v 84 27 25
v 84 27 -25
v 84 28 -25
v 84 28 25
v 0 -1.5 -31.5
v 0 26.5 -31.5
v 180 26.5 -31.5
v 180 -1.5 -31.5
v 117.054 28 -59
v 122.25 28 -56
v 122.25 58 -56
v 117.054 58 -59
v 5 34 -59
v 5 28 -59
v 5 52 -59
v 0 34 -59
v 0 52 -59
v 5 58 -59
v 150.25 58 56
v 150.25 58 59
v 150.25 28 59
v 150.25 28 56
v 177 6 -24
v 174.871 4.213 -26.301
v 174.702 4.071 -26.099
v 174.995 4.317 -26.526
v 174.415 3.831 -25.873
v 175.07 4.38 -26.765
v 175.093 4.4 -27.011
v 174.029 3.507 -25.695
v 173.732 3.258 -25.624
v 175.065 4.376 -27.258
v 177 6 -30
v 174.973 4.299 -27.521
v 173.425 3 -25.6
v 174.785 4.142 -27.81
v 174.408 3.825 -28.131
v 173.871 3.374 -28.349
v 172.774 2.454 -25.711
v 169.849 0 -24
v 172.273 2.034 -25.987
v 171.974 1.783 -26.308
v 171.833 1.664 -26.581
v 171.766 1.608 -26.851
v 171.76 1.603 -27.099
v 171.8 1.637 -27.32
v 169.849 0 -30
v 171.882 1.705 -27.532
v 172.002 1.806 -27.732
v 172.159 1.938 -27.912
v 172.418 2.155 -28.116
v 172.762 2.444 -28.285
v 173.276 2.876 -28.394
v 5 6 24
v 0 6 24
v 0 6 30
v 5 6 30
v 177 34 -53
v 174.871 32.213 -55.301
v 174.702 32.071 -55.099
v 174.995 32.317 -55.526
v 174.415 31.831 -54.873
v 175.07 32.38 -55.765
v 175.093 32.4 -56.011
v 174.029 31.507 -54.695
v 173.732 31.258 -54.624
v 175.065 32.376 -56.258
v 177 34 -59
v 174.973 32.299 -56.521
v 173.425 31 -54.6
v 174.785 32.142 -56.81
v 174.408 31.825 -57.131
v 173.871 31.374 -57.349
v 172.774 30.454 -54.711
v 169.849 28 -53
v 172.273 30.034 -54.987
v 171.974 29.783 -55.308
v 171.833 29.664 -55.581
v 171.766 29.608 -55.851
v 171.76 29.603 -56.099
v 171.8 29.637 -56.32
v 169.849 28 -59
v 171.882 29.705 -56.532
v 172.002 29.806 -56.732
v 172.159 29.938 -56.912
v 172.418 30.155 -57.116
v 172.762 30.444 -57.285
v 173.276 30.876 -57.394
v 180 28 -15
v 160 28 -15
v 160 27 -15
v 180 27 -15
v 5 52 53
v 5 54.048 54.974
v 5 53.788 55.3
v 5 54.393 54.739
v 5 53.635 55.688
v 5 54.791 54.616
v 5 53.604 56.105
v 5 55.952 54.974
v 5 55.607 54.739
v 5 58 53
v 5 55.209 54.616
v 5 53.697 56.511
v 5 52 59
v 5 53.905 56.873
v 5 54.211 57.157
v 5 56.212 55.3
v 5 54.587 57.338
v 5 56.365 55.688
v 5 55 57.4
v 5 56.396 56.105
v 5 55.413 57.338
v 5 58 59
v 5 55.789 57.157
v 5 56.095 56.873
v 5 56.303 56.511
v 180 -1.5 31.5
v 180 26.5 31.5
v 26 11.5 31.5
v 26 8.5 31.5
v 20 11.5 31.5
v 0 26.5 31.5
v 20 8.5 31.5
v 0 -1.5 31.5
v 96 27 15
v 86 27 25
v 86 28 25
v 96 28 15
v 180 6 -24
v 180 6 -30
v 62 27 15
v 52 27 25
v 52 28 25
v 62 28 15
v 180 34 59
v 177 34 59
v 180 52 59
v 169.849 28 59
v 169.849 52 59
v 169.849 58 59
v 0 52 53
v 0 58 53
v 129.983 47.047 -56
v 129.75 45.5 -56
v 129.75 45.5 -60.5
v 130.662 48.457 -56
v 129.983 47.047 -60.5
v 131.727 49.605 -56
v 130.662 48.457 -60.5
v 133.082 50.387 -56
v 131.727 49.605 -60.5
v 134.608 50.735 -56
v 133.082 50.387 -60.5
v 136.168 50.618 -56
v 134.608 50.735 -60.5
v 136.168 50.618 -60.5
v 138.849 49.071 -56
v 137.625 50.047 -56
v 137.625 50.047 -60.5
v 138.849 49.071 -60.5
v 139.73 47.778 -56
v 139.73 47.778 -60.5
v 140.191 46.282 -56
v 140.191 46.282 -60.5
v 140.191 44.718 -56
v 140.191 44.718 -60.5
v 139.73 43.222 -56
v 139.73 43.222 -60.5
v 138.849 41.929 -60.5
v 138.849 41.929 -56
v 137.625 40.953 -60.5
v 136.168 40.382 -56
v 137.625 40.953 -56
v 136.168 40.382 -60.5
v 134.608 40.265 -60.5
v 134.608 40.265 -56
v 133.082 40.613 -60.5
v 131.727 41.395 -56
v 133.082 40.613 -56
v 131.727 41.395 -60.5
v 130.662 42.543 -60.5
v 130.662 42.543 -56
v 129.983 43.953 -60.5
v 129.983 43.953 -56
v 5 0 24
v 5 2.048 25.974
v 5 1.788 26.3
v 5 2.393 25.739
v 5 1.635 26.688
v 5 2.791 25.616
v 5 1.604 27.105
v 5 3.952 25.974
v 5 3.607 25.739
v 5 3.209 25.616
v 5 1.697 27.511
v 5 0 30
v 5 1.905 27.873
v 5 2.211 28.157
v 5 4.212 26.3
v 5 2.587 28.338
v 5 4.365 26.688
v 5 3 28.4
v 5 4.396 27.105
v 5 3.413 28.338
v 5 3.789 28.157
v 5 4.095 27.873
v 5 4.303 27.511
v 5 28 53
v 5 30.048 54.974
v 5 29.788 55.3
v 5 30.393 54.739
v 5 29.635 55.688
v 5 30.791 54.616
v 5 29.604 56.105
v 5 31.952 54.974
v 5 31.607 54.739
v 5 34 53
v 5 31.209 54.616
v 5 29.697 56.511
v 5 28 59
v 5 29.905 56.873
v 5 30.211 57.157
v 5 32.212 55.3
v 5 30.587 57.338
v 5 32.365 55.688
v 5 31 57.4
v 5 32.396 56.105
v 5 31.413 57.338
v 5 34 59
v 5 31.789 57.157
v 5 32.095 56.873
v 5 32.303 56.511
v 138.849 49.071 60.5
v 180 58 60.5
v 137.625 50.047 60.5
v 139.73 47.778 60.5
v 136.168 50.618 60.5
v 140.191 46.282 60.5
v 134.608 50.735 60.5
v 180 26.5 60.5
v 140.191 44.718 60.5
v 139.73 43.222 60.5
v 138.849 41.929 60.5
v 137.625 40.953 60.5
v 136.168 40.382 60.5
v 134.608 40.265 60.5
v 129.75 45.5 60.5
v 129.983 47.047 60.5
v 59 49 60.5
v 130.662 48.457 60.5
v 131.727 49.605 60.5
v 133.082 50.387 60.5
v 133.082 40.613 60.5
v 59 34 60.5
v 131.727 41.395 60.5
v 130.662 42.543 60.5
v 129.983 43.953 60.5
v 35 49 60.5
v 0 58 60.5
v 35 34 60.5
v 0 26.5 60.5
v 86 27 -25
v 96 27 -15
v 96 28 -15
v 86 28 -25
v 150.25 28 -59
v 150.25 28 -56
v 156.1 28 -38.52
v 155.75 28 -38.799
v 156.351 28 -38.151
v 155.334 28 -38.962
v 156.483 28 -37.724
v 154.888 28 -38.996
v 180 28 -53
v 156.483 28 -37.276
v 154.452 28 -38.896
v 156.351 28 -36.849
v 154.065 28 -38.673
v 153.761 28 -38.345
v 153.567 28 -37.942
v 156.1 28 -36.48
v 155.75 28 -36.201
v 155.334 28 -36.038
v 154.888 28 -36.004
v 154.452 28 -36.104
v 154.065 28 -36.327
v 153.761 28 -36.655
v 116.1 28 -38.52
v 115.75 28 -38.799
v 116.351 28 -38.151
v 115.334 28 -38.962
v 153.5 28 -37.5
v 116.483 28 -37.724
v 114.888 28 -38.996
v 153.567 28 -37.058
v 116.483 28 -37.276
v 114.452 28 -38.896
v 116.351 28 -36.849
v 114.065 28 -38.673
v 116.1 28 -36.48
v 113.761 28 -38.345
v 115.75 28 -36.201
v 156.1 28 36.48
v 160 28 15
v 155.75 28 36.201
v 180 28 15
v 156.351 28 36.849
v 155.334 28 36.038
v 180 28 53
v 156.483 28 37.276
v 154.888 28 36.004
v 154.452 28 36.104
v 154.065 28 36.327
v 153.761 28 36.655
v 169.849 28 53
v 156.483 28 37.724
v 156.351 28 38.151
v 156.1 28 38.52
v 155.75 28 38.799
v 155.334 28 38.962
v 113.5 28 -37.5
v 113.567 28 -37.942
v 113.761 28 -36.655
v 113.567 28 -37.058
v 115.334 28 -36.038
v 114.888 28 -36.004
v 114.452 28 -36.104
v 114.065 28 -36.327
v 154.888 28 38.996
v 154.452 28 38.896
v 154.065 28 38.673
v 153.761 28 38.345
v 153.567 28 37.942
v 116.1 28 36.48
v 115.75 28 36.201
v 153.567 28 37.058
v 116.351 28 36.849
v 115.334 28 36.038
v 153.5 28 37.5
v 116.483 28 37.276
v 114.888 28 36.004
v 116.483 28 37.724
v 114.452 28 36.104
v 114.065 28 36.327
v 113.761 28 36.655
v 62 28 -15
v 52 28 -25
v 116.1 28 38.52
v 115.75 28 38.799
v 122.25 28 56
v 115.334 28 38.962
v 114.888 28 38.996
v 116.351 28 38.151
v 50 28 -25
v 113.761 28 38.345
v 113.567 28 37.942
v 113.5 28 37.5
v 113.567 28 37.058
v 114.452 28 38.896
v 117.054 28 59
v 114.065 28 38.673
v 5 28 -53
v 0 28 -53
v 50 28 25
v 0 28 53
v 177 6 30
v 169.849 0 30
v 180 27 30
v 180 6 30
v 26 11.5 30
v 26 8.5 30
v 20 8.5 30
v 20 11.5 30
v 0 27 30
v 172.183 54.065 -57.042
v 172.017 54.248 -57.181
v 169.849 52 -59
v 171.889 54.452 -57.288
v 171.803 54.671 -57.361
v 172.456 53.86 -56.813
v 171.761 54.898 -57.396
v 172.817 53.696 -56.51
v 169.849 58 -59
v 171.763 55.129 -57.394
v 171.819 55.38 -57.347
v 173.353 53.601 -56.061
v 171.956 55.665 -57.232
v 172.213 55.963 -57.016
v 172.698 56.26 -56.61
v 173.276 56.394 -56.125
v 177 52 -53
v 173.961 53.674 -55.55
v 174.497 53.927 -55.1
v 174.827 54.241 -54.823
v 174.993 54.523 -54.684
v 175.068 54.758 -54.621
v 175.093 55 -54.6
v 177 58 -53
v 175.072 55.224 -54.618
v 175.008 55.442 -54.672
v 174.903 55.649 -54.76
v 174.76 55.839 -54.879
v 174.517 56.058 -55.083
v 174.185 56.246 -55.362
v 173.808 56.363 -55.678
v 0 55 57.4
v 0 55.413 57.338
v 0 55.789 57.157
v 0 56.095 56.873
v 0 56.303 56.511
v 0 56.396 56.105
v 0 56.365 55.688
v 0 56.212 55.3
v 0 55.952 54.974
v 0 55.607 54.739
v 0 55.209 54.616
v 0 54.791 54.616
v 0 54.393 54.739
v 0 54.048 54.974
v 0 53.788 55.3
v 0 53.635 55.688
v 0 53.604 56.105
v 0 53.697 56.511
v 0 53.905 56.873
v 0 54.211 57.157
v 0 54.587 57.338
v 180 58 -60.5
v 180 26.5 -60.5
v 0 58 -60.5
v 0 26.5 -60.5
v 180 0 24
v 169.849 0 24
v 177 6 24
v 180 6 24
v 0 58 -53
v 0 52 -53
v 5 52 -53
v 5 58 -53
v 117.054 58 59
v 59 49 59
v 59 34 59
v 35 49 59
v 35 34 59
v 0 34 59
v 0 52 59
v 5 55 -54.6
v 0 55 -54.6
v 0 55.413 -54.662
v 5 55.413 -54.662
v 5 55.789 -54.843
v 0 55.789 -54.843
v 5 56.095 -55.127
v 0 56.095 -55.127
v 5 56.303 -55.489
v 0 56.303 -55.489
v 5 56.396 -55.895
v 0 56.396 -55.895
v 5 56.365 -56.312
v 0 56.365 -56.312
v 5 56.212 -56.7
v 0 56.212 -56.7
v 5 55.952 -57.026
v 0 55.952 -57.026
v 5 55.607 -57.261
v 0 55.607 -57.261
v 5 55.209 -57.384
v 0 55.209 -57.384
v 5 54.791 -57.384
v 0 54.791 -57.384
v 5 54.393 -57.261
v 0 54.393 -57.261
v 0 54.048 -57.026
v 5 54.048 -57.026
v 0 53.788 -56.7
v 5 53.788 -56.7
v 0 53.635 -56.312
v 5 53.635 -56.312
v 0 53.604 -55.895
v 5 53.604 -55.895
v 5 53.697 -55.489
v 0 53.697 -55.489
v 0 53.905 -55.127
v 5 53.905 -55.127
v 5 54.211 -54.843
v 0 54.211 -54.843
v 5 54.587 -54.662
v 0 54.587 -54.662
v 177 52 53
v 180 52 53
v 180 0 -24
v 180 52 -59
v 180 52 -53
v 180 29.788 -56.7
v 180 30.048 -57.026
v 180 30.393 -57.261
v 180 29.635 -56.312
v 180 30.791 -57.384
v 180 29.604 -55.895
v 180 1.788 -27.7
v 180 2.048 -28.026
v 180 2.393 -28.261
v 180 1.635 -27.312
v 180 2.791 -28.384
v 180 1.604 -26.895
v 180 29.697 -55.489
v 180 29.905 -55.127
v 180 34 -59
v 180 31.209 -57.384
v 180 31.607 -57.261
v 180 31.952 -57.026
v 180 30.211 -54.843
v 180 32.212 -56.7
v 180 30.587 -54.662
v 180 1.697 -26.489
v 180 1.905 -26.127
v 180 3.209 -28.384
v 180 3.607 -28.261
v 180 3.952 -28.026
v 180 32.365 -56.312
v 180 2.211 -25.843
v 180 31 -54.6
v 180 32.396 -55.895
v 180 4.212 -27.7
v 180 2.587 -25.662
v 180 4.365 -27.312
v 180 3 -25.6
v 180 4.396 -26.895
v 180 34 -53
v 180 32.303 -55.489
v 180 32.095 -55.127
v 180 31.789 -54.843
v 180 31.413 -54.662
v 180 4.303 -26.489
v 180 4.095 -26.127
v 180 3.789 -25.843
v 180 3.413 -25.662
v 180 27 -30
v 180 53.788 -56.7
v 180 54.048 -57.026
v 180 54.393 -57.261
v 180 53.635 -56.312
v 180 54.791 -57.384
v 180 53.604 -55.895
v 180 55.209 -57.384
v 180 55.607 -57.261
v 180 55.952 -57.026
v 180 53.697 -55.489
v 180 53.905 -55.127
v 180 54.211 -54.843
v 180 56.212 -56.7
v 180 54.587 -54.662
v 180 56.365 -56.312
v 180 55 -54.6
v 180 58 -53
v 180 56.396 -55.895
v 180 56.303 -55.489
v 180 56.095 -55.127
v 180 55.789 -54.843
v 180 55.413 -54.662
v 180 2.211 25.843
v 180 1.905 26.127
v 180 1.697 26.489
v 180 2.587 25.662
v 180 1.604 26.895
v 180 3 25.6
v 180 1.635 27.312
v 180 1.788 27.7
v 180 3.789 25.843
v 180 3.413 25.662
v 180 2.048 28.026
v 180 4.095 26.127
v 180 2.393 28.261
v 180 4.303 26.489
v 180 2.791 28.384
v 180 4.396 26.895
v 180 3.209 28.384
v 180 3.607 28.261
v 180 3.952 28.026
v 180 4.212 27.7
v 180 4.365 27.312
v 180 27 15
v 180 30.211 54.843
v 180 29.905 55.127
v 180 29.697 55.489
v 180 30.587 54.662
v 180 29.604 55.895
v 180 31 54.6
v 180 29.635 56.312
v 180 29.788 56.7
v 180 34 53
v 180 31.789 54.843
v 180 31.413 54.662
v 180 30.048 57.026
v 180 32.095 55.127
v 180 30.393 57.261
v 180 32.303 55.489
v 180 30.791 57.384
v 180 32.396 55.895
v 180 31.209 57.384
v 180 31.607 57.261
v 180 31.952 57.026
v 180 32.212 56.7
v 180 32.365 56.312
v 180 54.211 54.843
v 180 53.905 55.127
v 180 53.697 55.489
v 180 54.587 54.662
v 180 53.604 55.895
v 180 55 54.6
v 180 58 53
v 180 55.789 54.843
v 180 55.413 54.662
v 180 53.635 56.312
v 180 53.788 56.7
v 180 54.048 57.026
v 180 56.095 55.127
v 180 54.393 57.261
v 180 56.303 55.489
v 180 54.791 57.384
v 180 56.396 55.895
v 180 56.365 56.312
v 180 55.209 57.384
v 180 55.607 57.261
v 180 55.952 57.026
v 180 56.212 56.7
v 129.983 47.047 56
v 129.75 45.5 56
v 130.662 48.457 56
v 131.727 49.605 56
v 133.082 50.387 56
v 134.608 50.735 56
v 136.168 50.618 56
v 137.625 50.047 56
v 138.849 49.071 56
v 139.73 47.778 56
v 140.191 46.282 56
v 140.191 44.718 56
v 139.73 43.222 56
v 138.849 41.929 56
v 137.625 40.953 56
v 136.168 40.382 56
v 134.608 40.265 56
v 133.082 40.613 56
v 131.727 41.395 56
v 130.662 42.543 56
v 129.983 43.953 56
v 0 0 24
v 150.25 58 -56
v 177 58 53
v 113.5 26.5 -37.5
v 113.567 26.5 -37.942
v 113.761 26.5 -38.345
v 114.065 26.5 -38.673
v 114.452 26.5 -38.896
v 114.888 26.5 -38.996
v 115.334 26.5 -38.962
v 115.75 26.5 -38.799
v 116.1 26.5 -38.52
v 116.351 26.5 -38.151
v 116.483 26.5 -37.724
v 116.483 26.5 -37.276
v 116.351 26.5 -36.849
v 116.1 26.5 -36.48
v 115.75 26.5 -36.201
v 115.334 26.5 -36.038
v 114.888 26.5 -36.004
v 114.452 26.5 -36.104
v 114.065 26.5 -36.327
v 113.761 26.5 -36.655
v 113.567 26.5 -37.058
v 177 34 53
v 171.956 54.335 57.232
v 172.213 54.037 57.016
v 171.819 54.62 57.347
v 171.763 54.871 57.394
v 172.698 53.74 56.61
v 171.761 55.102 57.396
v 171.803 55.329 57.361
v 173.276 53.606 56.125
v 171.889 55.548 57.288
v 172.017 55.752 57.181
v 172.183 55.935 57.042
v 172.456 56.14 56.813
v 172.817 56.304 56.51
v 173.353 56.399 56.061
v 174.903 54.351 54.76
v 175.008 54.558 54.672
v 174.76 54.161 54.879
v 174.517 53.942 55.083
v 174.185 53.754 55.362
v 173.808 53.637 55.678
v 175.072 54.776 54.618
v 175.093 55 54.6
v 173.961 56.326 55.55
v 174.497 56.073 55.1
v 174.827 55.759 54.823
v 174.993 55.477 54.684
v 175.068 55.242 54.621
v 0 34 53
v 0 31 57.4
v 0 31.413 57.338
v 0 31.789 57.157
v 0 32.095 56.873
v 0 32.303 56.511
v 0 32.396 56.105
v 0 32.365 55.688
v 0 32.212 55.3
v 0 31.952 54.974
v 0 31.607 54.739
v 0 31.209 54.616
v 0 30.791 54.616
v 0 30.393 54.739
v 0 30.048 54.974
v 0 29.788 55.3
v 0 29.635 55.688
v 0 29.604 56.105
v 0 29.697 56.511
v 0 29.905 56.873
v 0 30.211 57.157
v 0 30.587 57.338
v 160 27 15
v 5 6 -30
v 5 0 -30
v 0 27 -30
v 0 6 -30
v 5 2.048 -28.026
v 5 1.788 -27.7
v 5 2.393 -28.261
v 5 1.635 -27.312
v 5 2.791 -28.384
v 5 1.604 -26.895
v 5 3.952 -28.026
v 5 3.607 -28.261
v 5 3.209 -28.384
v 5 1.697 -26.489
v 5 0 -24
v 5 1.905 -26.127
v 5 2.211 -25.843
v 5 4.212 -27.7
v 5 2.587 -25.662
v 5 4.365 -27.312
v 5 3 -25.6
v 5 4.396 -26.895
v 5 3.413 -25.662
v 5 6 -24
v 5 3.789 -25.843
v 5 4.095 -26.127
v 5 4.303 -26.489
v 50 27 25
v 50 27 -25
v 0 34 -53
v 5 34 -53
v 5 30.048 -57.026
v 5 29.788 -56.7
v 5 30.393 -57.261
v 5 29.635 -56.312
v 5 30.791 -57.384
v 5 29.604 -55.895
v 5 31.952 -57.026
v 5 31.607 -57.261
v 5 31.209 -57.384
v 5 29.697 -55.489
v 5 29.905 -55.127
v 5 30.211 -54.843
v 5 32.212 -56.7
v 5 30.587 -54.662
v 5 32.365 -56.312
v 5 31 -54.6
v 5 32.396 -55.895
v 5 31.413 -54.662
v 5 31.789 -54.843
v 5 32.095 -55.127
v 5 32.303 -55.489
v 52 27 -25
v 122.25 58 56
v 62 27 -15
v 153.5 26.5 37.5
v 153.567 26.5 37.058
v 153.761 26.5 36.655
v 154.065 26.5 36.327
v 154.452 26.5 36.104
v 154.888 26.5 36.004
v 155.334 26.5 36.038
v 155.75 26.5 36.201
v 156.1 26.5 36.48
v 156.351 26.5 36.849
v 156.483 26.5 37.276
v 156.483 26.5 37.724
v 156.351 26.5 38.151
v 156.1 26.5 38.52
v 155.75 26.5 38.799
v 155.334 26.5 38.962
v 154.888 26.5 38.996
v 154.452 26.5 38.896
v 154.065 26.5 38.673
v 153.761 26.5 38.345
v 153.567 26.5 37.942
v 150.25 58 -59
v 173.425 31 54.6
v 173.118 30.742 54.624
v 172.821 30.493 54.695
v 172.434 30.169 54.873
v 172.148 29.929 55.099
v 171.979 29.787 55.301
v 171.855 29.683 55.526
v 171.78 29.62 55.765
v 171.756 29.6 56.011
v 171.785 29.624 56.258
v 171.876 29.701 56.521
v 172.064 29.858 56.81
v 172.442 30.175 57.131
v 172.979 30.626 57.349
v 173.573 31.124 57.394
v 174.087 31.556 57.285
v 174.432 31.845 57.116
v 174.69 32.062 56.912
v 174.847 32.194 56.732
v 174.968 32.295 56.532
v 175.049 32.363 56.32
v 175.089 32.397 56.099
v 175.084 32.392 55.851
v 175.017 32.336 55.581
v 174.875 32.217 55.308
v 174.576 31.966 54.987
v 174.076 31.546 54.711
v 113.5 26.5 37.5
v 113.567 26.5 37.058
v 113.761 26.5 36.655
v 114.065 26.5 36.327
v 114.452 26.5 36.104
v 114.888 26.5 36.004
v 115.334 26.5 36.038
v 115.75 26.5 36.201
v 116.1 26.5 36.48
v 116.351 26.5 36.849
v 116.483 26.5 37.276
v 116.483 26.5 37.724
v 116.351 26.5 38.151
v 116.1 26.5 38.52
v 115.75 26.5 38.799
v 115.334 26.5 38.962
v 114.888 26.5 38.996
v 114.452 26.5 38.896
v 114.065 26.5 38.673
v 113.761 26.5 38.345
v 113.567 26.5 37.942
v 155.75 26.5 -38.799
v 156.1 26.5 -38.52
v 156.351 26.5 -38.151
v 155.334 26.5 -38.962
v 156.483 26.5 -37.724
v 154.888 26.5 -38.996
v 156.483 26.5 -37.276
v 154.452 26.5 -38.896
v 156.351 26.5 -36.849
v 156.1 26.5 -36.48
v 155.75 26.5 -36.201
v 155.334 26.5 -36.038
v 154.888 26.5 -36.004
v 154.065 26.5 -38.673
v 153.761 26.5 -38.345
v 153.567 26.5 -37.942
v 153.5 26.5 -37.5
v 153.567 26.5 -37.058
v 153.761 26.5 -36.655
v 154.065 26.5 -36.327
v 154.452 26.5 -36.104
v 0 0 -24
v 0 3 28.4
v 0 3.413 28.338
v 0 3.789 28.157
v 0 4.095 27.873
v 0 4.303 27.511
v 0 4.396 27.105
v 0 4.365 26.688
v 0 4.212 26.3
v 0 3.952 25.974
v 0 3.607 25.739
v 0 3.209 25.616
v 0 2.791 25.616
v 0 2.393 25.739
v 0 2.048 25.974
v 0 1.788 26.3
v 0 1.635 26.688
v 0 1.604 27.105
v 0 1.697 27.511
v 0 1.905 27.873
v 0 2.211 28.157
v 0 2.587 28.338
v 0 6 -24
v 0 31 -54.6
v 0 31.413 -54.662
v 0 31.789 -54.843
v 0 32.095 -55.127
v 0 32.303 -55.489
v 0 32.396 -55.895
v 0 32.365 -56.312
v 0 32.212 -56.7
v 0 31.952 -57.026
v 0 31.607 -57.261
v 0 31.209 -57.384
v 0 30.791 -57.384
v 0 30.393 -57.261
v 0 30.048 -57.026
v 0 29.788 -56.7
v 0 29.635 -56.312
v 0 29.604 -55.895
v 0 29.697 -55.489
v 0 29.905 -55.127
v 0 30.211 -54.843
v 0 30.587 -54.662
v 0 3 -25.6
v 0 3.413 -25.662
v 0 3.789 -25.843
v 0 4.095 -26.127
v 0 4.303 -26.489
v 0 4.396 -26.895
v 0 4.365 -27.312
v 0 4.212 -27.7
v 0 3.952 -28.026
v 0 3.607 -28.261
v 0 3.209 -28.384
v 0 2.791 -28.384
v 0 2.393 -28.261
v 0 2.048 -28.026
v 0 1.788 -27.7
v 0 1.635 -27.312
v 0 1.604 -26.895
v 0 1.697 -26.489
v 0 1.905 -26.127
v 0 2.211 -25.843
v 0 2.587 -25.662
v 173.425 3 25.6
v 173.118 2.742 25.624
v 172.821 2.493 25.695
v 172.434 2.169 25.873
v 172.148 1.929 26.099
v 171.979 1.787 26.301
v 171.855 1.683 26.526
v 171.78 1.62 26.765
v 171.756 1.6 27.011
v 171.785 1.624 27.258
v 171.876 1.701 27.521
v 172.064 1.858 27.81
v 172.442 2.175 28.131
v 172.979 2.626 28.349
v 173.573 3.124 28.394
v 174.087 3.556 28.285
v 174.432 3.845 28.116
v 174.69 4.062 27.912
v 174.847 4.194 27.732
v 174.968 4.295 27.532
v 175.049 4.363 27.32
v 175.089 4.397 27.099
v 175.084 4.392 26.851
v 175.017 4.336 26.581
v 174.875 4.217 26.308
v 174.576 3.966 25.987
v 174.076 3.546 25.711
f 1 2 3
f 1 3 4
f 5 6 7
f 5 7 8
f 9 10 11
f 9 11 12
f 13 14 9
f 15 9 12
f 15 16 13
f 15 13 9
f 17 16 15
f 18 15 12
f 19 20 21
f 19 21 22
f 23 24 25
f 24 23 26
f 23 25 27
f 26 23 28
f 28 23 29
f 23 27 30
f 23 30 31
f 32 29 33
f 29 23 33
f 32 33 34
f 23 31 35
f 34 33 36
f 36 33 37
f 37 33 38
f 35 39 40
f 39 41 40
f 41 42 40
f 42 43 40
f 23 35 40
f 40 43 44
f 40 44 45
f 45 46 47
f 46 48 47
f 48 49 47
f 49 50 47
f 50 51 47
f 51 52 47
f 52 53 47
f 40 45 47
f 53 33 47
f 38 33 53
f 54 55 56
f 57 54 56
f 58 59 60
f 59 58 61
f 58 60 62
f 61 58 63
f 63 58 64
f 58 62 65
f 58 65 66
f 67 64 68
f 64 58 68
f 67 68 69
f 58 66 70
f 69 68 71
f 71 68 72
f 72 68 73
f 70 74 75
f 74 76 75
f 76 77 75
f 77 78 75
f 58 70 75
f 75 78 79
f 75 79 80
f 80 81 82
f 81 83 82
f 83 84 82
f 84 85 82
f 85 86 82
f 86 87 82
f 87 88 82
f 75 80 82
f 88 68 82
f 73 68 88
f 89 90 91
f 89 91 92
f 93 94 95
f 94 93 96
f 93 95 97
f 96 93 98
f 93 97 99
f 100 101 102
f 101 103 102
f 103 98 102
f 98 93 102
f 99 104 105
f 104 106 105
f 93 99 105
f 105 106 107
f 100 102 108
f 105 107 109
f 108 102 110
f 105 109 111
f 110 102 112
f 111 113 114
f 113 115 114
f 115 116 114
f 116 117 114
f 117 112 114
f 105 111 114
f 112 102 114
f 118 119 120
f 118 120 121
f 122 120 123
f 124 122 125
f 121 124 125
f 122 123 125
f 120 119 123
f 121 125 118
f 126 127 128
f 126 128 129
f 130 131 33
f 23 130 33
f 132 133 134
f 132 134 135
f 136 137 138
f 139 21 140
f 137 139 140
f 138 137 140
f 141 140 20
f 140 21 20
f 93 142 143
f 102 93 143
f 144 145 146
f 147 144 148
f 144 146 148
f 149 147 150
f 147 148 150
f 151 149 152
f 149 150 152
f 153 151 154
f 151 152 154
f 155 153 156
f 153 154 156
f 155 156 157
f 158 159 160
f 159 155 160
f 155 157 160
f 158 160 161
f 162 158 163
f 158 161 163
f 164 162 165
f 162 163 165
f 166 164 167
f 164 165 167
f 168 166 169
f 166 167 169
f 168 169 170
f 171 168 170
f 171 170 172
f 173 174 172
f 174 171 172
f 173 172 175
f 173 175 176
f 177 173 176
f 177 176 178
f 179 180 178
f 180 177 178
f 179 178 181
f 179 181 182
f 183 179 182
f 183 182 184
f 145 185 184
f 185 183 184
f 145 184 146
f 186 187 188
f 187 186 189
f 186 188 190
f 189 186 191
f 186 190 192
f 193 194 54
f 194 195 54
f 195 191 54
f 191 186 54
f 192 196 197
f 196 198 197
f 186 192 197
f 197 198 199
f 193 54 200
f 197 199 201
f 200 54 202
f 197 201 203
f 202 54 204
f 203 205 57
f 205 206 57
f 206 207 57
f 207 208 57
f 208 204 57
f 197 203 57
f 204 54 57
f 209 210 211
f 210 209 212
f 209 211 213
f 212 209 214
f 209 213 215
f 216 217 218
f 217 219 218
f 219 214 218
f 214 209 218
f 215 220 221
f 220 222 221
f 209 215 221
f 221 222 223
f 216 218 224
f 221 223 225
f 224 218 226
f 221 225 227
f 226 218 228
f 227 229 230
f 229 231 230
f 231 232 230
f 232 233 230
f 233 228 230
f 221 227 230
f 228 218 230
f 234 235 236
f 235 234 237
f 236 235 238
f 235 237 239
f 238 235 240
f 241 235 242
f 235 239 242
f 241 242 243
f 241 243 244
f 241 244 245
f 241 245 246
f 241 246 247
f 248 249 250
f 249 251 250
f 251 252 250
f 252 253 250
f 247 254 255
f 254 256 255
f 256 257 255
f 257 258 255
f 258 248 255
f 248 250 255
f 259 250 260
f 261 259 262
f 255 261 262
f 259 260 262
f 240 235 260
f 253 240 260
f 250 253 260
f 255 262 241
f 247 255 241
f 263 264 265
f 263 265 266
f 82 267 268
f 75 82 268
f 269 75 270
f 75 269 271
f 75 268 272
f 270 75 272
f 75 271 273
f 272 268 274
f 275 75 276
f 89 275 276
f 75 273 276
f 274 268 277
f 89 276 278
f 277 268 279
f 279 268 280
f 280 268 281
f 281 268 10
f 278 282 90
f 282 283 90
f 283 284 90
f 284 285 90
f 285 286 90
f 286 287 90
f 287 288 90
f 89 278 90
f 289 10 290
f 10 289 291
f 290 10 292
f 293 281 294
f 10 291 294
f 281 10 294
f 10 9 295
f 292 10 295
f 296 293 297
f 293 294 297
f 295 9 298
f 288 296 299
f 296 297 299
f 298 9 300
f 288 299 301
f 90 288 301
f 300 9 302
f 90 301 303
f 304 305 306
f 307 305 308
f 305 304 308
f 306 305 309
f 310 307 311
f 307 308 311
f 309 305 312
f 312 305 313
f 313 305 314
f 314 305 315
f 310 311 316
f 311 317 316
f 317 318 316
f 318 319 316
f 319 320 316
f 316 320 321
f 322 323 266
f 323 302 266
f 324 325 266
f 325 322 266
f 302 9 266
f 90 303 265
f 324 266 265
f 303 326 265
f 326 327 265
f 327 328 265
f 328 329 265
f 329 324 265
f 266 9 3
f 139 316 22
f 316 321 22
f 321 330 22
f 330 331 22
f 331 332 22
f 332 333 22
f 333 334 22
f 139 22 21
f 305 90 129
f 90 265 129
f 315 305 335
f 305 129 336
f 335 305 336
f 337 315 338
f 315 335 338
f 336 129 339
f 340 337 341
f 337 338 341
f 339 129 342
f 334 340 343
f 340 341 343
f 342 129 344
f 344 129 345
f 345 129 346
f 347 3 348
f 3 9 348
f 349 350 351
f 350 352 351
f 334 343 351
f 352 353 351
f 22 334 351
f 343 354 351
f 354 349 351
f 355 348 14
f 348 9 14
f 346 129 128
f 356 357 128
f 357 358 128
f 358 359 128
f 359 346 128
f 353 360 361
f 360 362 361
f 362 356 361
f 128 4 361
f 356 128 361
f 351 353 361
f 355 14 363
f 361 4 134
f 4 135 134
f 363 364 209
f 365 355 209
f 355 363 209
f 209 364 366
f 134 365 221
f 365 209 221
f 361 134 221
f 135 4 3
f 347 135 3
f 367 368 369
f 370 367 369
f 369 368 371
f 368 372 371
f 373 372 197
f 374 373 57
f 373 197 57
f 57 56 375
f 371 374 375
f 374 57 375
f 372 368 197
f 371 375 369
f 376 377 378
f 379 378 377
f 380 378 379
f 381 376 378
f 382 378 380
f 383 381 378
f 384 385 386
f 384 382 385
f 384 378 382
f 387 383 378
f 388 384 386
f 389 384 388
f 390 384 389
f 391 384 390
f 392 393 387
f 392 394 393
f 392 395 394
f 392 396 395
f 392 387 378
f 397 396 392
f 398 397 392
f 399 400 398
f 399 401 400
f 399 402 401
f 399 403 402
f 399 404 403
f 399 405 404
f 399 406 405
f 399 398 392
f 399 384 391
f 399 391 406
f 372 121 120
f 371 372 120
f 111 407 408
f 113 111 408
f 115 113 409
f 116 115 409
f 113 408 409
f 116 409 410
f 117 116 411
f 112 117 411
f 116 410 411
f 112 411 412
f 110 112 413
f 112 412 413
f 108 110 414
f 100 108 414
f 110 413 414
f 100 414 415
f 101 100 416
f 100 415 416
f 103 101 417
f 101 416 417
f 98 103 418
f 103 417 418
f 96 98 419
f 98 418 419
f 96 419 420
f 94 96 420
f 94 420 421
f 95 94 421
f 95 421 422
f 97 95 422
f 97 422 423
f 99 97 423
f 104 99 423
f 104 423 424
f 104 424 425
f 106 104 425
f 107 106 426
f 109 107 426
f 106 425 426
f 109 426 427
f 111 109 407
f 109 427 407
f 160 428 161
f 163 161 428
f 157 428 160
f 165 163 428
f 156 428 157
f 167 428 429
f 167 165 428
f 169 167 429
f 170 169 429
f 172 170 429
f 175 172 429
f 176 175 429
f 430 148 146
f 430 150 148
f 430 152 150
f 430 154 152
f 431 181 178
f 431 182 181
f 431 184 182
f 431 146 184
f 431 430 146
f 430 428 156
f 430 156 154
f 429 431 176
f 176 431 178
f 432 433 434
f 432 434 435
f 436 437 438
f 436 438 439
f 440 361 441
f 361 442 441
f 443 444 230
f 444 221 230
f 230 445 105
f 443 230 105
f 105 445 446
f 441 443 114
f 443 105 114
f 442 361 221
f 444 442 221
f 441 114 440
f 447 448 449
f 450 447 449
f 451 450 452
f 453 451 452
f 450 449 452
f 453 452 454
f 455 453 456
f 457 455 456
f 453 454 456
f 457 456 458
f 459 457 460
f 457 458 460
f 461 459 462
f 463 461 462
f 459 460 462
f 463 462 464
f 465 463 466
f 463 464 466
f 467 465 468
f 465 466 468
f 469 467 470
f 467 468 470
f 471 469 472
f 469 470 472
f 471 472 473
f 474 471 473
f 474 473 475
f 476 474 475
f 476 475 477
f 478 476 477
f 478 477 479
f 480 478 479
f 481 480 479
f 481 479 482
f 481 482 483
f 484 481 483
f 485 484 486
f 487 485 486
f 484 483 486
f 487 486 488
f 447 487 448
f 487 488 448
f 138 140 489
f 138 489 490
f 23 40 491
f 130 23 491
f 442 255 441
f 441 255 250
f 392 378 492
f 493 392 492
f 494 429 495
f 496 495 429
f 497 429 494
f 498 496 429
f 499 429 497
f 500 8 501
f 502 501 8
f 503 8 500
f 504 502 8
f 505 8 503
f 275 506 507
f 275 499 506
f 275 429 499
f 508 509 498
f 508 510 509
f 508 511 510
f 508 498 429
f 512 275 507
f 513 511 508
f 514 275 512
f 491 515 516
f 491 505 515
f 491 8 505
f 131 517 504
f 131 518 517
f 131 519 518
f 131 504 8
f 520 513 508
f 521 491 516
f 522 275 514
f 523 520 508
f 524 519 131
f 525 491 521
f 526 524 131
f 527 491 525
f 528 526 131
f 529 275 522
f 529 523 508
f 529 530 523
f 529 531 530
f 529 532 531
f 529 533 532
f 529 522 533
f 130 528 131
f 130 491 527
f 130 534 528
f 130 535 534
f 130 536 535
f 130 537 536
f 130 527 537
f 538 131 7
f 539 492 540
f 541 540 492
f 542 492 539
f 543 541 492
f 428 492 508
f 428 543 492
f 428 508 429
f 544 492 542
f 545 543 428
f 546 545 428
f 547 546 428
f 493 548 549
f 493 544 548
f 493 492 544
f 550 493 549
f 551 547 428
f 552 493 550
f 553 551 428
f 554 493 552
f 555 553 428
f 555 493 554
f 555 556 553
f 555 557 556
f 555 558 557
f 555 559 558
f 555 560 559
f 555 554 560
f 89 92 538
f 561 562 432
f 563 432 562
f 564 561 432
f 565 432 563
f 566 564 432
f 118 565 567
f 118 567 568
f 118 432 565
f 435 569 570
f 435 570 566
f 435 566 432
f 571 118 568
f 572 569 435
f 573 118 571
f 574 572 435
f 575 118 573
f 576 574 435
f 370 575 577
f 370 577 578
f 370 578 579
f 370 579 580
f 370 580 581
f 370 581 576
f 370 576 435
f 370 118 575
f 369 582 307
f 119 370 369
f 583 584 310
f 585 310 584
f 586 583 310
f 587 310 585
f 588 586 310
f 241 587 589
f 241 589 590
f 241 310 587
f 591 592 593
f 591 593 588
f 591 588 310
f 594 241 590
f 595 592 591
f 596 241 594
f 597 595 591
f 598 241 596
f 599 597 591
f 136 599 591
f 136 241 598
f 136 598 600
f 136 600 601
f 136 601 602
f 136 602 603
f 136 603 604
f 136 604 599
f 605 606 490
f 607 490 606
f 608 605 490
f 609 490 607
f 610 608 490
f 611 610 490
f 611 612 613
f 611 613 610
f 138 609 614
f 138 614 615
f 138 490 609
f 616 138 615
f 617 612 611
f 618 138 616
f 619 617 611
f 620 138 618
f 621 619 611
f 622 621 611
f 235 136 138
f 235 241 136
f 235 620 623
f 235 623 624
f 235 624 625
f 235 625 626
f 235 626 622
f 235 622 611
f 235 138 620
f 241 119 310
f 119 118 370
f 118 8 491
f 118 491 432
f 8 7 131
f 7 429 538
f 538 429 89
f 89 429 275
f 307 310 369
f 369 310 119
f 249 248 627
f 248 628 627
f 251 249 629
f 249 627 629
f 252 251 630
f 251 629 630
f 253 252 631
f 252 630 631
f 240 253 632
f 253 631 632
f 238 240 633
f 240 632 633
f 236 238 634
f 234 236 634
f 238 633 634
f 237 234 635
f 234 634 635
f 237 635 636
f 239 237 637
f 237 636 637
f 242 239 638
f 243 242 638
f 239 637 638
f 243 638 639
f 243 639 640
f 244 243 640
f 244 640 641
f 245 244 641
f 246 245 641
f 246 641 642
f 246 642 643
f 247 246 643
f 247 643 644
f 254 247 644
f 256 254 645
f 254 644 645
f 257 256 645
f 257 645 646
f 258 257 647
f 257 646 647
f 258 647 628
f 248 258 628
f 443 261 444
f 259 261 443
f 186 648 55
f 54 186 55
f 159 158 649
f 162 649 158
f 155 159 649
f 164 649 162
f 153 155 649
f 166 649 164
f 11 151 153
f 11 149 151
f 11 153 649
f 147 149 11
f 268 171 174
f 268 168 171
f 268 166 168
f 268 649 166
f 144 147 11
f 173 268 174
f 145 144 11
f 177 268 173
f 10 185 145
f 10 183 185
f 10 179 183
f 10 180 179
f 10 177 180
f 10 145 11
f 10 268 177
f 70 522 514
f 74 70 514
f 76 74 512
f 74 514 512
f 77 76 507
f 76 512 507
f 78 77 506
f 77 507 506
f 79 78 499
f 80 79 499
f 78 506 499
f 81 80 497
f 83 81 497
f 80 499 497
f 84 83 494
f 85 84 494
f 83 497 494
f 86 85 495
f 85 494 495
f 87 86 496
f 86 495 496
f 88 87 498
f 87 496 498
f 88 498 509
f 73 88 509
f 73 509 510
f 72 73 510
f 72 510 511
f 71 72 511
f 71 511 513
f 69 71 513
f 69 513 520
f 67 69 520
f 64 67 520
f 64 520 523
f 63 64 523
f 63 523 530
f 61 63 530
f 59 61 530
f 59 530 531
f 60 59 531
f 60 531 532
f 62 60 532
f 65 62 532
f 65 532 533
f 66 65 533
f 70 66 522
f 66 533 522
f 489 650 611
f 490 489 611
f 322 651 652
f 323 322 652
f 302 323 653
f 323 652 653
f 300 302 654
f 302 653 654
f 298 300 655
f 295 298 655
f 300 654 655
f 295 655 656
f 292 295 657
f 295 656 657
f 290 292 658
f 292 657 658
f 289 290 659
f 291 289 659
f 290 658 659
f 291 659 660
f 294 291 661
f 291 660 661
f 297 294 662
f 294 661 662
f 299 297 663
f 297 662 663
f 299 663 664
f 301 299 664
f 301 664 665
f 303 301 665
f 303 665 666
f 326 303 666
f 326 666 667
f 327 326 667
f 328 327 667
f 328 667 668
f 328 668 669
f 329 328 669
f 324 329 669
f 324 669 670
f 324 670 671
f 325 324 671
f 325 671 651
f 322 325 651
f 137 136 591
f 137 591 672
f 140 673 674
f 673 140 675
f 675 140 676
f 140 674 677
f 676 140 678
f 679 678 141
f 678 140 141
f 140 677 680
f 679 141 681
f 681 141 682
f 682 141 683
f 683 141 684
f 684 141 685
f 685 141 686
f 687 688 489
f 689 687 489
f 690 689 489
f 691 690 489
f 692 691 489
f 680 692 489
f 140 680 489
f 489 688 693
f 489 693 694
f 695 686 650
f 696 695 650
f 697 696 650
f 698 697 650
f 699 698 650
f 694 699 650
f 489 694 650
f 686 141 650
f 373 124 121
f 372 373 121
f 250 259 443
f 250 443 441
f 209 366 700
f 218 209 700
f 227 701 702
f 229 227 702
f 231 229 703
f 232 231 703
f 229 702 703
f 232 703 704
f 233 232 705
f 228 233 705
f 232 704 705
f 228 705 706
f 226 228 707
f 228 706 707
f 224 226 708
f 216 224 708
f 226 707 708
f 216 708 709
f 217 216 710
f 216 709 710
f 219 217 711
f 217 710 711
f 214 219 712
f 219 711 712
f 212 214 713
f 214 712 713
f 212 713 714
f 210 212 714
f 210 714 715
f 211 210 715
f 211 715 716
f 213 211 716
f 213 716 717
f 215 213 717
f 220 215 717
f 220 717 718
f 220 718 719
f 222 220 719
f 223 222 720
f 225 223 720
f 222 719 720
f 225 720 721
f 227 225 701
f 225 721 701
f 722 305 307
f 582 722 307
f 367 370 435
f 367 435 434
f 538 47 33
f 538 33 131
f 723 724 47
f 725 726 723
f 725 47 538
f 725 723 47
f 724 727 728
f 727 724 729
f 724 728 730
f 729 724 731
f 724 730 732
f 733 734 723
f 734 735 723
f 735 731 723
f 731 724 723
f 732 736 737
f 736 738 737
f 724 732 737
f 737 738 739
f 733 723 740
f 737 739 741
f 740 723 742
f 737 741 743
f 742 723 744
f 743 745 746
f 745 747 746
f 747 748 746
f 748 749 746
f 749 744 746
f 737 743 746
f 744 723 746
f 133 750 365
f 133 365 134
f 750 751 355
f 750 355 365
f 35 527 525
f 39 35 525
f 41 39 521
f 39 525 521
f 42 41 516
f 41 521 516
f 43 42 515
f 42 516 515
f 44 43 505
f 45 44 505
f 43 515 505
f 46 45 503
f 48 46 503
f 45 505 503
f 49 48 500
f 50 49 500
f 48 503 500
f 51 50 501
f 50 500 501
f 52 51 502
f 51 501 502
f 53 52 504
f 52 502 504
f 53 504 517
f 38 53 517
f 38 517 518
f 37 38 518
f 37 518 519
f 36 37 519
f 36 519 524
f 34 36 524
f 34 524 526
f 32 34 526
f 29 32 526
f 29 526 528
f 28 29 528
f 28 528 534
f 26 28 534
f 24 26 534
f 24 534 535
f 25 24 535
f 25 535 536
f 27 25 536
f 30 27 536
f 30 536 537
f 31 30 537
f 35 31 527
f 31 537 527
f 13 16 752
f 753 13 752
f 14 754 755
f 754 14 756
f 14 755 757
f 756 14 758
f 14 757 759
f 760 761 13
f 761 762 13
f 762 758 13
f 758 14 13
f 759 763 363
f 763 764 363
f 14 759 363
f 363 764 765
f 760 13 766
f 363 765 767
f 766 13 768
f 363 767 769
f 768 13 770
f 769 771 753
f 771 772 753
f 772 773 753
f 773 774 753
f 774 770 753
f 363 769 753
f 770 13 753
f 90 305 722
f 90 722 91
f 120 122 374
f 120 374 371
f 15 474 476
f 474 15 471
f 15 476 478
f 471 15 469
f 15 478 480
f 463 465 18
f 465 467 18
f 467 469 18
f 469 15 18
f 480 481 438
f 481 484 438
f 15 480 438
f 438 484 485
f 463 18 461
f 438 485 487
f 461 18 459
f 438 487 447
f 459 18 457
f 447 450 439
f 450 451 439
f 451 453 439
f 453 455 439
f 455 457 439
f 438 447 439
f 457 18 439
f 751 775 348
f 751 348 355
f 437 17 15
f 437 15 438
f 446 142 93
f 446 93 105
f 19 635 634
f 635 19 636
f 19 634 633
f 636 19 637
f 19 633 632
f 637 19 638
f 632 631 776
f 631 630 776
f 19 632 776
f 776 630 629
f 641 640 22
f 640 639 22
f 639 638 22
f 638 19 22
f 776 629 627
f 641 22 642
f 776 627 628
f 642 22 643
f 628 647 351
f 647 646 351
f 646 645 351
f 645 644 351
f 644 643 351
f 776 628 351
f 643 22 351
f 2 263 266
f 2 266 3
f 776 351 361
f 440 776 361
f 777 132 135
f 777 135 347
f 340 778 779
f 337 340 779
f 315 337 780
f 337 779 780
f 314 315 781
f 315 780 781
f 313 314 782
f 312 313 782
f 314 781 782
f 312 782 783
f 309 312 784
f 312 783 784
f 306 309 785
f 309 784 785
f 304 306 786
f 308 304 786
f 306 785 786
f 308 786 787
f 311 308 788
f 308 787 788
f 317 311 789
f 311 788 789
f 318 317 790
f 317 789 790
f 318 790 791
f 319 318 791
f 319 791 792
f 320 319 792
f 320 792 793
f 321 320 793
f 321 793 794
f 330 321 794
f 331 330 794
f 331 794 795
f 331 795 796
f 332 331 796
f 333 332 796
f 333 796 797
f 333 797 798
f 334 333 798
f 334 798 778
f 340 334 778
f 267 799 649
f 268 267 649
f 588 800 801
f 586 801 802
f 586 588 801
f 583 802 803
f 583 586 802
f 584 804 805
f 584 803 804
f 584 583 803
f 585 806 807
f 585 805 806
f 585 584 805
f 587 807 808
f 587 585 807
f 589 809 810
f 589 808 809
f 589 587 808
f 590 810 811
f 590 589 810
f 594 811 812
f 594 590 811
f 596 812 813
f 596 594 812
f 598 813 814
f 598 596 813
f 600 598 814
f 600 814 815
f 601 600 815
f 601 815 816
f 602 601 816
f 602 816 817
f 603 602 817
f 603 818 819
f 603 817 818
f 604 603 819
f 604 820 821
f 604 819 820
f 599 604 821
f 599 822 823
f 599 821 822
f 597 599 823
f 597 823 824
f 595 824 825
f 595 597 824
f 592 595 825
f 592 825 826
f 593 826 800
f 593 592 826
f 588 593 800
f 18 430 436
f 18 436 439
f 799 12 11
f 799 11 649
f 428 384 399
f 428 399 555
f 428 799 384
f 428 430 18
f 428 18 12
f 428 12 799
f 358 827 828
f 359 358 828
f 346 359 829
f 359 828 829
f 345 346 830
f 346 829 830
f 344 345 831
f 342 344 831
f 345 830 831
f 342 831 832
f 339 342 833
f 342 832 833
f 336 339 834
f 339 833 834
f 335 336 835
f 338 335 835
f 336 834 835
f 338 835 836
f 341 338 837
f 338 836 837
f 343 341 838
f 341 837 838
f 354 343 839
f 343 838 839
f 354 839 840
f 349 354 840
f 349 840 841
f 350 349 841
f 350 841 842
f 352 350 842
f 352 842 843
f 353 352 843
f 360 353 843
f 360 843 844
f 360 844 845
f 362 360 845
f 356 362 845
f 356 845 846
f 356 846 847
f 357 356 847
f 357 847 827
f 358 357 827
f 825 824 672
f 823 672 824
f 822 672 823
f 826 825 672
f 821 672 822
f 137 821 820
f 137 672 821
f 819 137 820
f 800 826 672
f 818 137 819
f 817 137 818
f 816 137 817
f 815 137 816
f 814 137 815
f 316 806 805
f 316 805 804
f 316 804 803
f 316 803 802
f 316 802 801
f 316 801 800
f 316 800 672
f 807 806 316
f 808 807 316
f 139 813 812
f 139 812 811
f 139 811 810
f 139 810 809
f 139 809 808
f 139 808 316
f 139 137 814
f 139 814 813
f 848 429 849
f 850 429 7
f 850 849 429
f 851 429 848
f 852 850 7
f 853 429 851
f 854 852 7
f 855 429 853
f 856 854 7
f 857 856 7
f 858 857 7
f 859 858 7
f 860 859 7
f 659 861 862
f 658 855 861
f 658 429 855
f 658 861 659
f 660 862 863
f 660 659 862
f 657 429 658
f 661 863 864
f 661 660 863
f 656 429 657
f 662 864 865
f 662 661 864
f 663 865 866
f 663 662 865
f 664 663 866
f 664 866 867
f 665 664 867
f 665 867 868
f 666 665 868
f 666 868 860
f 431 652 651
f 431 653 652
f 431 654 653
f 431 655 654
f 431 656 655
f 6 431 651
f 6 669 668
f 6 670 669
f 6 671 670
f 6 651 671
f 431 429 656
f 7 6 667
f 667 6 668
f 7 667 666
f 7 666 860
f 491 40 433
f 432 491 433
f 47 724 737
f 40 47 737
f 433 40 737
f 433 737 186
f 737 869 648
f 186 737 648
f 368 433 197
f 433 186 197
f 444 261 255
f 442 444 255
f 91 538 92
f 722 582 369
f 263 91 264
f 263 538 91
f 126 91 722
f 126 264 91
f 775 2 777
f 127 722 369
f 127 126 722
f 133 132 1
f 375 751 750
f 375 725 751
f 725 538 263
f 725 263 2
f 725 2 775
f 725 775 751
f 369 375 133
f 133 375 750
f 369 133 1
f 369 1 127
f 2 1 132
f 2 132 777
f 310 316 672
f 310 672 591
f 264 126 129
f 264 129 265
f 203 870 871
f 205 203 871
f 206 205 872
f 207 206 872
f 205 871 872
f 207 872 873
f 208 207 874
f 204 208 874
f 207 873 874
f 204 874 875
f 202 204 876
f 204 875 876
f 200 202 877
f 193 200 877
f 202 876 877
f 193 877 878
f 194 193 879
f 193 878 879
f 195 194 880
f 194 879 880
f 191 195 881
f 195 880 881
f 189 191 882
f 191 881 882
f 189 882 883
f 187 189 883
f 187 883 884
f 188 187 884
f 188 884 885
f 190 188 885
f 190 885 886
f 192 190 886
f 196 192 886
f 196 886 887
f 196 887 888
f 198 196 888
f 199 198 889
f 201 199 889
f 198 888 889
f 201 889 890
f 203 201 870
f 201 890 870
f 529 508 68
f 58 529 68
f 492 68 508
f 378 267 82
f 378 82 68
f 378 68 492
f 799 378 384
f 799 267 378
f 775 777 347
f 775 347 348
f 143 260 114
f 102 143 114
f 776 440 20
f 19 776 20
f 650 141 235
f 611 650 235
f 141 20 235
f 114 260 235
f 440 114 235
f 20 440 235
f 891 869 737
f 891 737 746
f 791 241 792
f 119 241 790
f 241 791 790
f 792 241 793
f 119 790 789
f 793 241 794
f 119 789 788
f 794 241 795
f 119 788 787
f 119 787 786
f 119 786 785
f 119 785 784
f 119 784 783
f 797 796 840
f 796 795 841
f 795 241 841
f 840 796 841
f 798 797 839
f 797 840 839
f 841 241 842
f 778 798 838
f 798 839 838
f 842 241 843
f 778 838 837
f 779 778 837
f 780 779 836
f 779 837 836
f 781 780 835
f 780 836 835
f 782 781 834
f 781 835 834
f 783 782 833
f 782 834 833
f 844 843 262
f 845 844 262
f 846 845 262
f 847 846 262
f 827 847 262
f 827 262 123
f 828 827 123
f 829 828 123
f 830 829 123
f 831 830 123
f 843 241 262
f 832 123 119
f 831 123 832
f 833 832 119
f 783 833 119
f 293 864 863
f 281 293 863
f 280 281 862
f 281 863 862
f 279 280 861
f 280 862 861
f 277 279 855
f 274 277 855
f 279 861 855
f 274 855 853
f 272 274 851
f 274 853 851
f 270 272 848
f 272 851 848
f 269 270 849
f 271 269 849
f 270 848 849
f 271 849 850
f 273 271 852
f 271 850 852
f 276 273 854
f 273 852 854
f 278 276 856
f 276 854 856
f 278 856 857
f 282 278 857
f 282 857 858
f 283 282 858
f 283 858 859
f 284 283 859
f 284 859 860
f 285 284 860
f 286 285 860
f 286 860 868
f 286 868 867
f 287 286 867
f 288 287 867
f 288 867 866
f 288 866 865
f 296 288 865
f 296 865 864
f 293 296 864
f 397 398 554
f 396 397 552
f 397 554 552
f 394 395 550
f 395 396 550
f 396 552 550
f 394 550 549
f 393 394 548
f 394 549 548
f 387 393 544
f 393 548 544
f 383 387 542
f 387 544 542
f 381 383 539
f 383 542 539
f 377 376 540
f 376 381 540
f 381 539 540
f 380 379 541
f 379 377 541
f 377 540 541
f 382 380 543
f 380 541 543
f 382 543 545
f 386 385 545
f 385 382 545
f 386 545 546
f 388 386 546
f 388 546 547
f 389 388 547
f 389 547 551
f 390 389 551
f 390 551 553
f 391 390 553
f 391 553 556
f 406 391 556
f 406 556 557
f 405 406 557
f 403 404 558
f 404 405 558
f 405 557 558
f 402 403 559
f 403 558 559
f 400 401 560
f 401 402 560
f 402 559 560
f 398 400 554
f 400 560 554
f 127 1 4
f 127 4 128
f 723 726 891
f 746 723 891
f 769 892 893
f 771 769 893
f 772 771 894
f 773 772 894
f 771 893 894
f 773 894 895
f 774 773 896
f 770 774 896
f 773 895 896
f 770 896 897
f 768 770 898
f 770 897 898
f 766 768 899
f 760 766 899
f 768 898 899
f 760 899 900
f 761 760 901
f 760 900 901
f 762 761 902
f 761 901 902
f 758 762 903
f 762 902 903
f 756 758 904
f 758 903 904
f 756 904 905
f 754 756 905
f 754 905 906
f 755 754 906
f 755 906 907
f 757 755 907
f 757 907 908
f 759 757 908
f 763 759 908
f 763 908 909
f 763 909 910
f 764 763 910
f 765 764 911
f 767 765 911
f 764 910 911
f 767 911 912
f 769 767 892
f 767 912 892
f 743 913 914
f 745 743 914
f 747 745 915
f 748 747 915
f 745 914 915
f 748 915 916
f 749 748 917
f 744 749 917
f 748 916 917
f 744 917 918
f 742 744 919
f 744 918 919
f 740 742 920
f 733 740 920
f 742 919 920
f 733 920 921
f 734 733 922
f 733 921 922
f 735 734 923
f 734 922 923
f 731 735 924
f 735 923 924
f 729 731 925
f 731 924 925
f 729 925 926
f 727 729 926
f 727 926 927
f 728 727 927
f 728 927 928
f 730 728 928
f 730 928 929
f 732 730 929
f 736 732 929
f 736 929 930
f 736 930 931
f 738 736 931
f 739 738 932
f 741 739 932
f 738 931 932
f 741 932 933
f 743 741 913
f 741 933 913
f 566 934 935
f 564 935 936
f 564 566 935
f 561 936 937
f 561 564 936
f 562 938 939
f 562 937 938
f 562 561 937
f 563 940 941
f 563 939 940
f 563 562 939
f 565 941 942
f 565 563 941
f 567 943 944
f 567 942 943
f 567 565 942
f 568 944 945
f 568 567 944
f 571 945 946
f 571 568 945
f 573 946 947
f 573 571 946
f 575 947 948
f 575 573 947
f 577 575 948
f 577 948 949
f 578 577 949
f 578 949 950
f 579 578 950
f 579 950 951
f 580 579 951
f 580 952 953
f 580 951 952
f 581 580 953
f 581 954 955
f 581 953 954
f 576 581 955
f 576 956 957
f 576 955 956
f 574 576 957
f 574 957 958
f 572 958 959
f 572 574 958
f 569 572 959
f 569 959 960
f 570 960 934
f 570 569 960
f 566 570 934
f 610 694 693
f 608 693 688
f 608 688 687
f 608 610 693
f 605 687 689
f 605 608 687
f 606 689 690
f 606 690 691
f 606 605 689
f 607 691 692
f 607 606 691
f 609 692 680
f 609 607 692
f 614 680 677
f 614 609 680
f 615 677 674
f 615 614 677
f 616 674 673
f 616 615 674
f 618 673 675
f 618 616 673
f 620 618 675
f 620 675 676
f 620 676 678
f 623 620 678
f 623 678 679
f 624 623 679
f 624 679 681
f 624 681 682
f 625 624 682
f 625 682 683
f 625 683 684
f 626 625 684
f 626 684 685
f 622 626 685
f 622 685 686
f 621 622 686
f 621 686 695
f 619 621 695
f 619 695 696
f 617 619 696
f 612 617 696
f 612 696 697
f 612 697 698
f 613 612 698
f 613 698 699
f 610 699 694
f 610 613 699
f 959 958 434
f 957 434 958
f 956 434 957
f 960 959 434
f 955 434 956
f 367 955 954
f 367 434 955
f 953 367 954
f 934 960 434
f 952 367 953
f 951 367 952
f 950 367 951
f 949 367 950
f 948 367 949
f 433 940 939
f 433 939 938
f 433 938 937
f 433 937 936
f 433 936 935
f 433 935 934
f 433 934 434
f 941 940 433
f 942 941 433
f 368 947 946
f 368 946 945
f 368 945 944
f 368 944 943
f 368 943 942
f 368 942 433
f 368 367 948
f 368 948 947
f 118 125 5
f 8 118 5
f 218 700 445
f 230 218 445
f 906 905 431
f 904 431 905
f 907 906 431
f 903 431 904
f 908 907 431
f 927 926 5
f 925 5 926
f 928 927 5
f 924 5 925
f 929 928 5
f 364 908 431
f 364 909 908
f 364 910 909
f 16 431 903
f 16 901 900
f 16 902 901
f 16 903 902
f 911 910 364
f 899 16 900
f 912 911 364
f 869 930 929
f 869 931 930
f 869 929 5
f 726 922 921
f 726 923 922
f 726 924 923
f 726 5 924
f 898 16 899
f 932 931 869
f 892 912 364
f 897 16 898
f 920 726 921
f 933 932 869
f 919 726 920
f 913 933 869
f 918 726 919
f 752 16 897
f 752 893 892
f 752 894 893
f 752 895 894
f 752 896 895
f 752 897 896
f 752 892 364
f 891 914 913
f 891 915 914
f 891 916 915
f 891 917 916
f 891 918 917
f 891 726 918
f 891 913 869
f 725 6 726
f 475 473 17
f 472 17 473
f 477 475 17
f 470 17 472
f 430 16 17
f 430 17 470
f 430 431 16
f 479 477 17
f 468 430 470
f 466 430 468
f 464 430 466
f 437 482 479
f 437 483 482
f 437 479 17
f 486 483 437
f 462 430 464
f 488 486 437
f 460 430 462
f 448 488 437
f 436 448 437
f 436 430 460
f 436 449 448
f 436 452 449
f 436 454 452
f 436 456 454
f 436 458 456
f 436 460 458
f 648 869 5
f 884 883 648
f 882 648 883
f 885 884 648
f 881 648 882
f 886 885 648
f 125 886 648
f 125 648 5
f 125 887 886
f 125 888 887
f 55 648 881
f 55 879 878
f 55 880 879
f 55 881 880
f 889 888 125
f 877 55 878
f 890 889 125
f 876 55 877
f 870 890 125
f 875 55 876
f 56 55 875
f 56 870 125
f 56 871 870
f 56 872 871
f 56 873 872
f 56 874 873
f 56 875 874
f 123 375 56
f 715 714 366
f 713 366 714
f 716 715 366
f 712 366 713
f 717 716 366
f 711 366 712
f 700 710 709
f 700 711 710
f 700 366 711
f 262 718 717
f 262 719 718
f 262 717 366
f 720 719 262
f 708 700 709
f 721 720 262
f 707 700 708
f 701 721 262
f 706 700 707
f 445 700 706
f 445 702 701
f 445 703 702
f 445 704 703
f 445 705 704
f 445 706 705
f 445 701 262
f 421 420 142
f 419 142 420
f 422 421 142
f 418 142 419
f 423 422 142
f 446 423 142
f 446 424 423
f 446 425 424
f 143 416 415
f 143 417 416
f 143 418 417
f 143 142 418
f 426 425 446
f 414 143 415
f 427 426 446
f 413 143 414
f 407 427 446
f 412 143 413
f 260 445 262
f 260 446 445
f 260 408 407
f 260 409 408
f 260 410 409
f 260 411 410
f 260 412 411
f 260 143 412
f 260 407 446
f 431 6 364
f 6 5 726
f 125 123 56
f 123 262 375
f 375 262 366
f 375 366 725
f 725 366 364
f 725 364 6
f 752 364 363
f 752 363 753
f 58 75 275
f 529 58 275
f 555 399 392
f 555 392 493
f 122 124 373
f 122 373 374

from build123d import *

# Parameters (mm, degrees)
VYSUNOUT_TENKOST_NN_1_DEPTH       = 180
SKICA5_W                          = 60
SKICA5_H                          = 1
P_IDAT_VYSUNUT_M3_DEPTH           = 180
SKICA6_W                          = 40
SKICA6_H                          = 30
ODEBRAT_VYSUNUT_M2_DEPTH          = 3
SKICA7_W                          = 6
SKICA7_H                          = 6
P_IDAT_VYSUNUT_M4_DEPTH           = 5
SKICA8_R                          = 1.4
ODEBRAT_VYSUNUT_M3_DEPTH          = 5
SKICA9_R                          = 5.25
ODEBRAT_VYSUNUT_M4_DEPTH          = 225.510578815
P_IDAT_VYSUNUT_M7_DEPTH           = 6
SKICA16_R                         = 1.4
ODEBRAT_VYSUNUT_M13_DEPTH         = 10
P_IDAT_VYSUNUT_M8_DEPTH           = 6
SKICA18_R                         = 1.4
ODEBRAT_VYSUNUT_M14_DEPTH         = 16
P_IDAT_VYSUNUT_M9_DEPTH           = 6
SKICA20_R                         = 1.4
ODEBRAT_VYSUNUT_M15_DEPTH         = 16
ODEBRAT_START                     = -25
ODEBRAT_VYSUNUT_M16_DEPTH         = 8
P_IDAT_VYSUNUT_M10_DEPTH          = 30
SKICA23_R                         = 5.25
ODEBRAT_VYSUNUT_M17_DEPTH         = 224.705721876
D_RY_PRO_KOL_K_VELIKOST_MM1_D     = 3
D_RY_PRO_KOL_K_VELIKOST_MM1_DEPTH = 10
D_RY_PRO_KOL_K_VELIKOST_MM1_TIP   = 0.901290929
SKICA29_W                         = 6
SKICA29_H                         = 3
ODEBRAT_VYSUNUT_M18_DEPTH         = 10
SKICA30_W                         = 24
SKICA30_H                         = 15
ODEBRAT_VYSUNUT_M19_DEPTH         = 5


with BuildPart() as part:
    # Skica4 → Vysunout tenkostěnný1 (new body)
    with BuildSketch(Plane(origin=(0, 0, 0), x_dir=(0, 0, -1), z_dir=(1, 0, 0))):
        Polygon((0, 0), (30, 0), (30, 28), (59, 28), (59, 58), (60.5, 58), (60.5, 26.5), (31.5, 26.5), (31.5, -1.5), (0, -1.5), align=None)
    vysunout_tenkost_nn_1 = extrude(amount=VYSUNOUT_TENKOST_NN_1_DEPTH)

    # Zrcadlit1: Vysunout tenkostěnný1 across plane
    add(vysunout_tenkost_nn_1.mirror(Plane(origin=(180, -1.5, 0), x_dir=(1, 0, 0), z_dir=(0, 0, 1))))

    # Skica5 → Přidat vysunutím3 (add)
    with BuildSketch(Plane.ZY):
        with Locations((0, 27.5)):
            Rectangle(SKICA5_W, SKICA5_H)
    extrude(amount=-P_IDAT_VYSUNUT_M3_DEPTH)

    # Skica6 → Odebrat vysunutím2 (cut)
    with BuildSketch(Plane(origin=(0, 28, 0), x_dir=(1, 0, 0), z_dir=(0, 1, 0))):
        with Locations((180, 0)):
            Rectangle(SKICA6_W, SKICA6_H)
    extrude(amount=-ODEBRAT_VYSUNUT_M2_DEPTH, mode=Mode.SUBTRACT)

    # Skica7 → Přidat vysunutím4 (add)
    with BuildSketch(Plane.ZY):
        with Locations((-56, 31)):
            Rectangle(SKICA7_W, SKICA7_H)
        with Locations((-56, 55)):
            Rectangle(SKICA7_W, SKICA7_H)
        with Locations((56, 55)):
            Rectangle(SKICA7_W, SKICA7_H)
        with Locations((56, 31)):
            Rectangle(SKICA7_W, SKICA7_H)
        with Locations((27, 3)):
            Rectangle(SKICA7_W, SKICA7_H)
        with Locations((-27, 3)):
            Rectangle(SKICA7_W, SKICA7_H)
    extrude(amount=-P_IDAT_VYSUNUT_M4_DEPTH)

    # Skica8 → Odebrat vysunutím3 (cut)
    with BuildSketch(Plane.ZY):
        with Locations((-56, 55)):
            Circle(SKICA8_R)
        with Locations((-56, 31)):
            Circle(SKICA8_R)
        with Locations((-27, 3)):
            Circle(SKICA8_R)
        with Locations((27, 3)):
            Circle(SKICA8_R)
        with Locations((56, 31)):
            Circle(SKICA8_R)
        with Locations((56, 55)):
            Circle(SKICA8_R)
    extrude(amount=-ODEBRAT_VYSUNUT_M3_DEPTH, mode=Mode.SUBTRACT)

    # Skica9 → Odebrat vysunutím4 (cut, through all)
    with BuildSketch(Plane(origin=(0, 0, -60.5), x_dir=(-1, 0, 0), z_dir=(0, 0, -1))):
        with Locations((-135, 45.5)):
            Circle(SKICA9_R)
    extrude(amount=-ODEBRAT_VYSUNUT_M4_DEPTH, mode=Mode.SUBTRACT)

    # Skica15 → Přidat vysunutím7 (add)
    with BuildSketch(Plane.XY.offset(-30)):
        Polygon((180, 0), (180, 6), (177, 6), (169.849478444, 0), align=None)
    p_idat_vysunut_m7 = extrude(amount=P_IDAT_VYSUNUT_M7_DEPTH)

    # Skica16 → Odebrat vysunutím13 (cut)
    with BuildSketch(Plane(origin=(180, 0, 0), x_dir=(0, 0, -1), z_dir=(1, 0, 0))):
        with Locations(Location((27, 3, 0), (0, 0, 180))):
            Circle(SKICA16_R)
    odebrat_vysunut_m13 = extrude(amount=-ODEBRAT_VYSUNUT_M13_DEPTH, mode=Mode.SUBTRACT)

    # Skica17 → Přidat vysunutím8 (add)
    with BuildSketch(Plane.XY.offset(-59)):
        Polygon((180, 28), (180, 34), (177, 34), (169.849478444, 28), align=None)
    p_idat_vysunut_m8 = extrude(amount=P_IDAT_VYSUNUT_M8_DEPTH)

    # Skica18 → Odebrat vysunutím14 (cut)
    with BuildSketch(Plane(origin=(180, 0, 0), x_dir=(0, 0, -1), z_dir=(1, 0, 0))):
        with Locations(Location((56, 31, 0), (0, 0, 180))):
            Circle(SKICA18_R)
    odebrat_vysunut_m14 = extrude(amount=-ODEBRAT_VYSUNUT_M14_DEPTH, mode=Mode.SUBTRACT)

    # Skica19 → Přidat vysunutím9 (add)
    with BuildSketch(Plane(origin=(0, 58, 0), x_dir=(1, 0, 0), z_dir=(0, 1, 0))):
        Polygon((180, 59), (177, 59), (169.849478444, 59), (177, 53), (180, 53), align=None)
    p_idat_vysunut_m9 = extrude(amount=-P_IDAT_VYSUNUT_M9_DEPTH)

    # Skica20 → Odebrat vysunutím15 (cut)
    with BuildSketch(Plane(origin=(180, 0, 0), x_dir=(0, 0, -1), z_dir=(1, 0, 0))):
        with Locations(Location((56, 55, 0), (0, 0, 180))):
            Circle(SKICA20_R)
    odebrat_vysunut_m15 = extrude(amount=-ODEBRAT_VYSUNUT_M15_DEPTH, mode=Mode.SUBTRACT)

    # Zrcadlit2: Přidat vysunutím7, Odebrat vysunutím13, Přidat vysunutím8, Odebrat vysunutím14, Přidat vysunutím9, Odebrat vysunutím15 across plane
    add(p_idat_vysunut_m7.mirror(Plane.XY))
    add(odebrat_vysunut_m13.mirror(Plane.XY), mode=Mode.SUBTRACT)
    add(p_idat_vysunut_m8.mirror(Plane.XY))
    add(odebrat_vysunut_m14.mirror(Plane.XY), mode=Mode.SUBTRACT)
    add(p_idat_vysunut_m9.mirror(Plane.XY))
    add(odebrat_vysunut_m15.mirror(Plane.XY), mode=Mode.SUBTRACT)

    # Skica21 → Odebrat vysunutím16 (cut)
    with BuildSketch(Plane.XZ.offset(1.5).offset(ODEBRAT_START)):
        Polygon((62, -15), (52, -25), (50, -25), (50, 25), (52, 25), (62, 15), align=None)
        Polygon((86, -25), (84, -25), (84, 25), (86, 25), (96, 15), (96, -15), align=None)
    extrude(amount=-ODEBRAT_VYSUNUT_M16_DEPTH, mode=Mode.SUBTRACT)

    # Skica22 → Přidat vysunutím10 (add)
    with BuildSketch(Plane(origin=(0, 28, 0), x_dir=(1, 0, 0), z_dir=(0, 1, 0))):
        Polygon((117.053847577, 59), (150.25, 59), (150.25, 56), (122.25, 56), align=None)
        Polygon((122.25, -56), (117.053847577, -59), (150.25, -59), (150.25, -56), align=None)
    extrude(amount=P_IDAT_VYSUNUT_M10_DEPTH)

    # Skica23 → Odebrat vysunutím17 (cut, through all)
    with BuildSketch(Plane.XY.offset(59)):
        with Locations(Location((135, 45.5, 0), (0, 0, 180))):
            Circle(SKICA23_R)
    extrude(amount=-ODEBRAT_VYSUNUT_M17_DEPTH, mode=Mode.SUBTRACT)

    # Díry pro kolík, velikost mm1
    with Locations(Plane(origin=(0, 28, 0), x_dir=(1, 0, 0), z_dir=(0, 1, 0))):
        with Locations((155, -37.5), (115, -37.5), (115, 37.5), (155, 37.5)):
            Hole(D_RY_PRO_KOL_K_VELIKOST_MM1_D / 2, depth=D_RY_PRO_KOL_K_VELIKOST_MM1_DEPTH)
            with Locations((0, 0, -(D_RY_PRO_KOL_K_VELIKOST_MM1_DEPTH + D_RY_PRO_KOL_K_VELIKOST_MM1_TIP / 2))):  # 118° drill point
                Cone(0, D_RY_PRO_KOL_K_VELIKOST_MM1_D / 2, D_RY_PRO_KOL_K_VELIKOST_MM1_TIP, mode=Mode.SUBTRACT)

    # Skica29 → Odebrat vysunutím18 (cut)
    with BuildSketch(Plane.XY.offset(31.5)):
        with Locations((23, 10)):
            Rectangle(SKICA29_W, SKICA29_H)
    extrude(amount=-ODEBRAT_VYSUNUT_M18_DEPTH, mode=Mode.SUBTRACT)

    # Skica30 → Odebrat vysunutím19 (cut)
    with BuildSketch(Plane.XY.offset(60.5)):
        with Locations((47, 41.5)):
            Rectangle(SKICA30_W, SKICA30_H)
    extrude(amount=-ODEBRAT_VYSUNUT_M19_DEPTH, mode=Mode.SUBTRACT)


solid = part.part
